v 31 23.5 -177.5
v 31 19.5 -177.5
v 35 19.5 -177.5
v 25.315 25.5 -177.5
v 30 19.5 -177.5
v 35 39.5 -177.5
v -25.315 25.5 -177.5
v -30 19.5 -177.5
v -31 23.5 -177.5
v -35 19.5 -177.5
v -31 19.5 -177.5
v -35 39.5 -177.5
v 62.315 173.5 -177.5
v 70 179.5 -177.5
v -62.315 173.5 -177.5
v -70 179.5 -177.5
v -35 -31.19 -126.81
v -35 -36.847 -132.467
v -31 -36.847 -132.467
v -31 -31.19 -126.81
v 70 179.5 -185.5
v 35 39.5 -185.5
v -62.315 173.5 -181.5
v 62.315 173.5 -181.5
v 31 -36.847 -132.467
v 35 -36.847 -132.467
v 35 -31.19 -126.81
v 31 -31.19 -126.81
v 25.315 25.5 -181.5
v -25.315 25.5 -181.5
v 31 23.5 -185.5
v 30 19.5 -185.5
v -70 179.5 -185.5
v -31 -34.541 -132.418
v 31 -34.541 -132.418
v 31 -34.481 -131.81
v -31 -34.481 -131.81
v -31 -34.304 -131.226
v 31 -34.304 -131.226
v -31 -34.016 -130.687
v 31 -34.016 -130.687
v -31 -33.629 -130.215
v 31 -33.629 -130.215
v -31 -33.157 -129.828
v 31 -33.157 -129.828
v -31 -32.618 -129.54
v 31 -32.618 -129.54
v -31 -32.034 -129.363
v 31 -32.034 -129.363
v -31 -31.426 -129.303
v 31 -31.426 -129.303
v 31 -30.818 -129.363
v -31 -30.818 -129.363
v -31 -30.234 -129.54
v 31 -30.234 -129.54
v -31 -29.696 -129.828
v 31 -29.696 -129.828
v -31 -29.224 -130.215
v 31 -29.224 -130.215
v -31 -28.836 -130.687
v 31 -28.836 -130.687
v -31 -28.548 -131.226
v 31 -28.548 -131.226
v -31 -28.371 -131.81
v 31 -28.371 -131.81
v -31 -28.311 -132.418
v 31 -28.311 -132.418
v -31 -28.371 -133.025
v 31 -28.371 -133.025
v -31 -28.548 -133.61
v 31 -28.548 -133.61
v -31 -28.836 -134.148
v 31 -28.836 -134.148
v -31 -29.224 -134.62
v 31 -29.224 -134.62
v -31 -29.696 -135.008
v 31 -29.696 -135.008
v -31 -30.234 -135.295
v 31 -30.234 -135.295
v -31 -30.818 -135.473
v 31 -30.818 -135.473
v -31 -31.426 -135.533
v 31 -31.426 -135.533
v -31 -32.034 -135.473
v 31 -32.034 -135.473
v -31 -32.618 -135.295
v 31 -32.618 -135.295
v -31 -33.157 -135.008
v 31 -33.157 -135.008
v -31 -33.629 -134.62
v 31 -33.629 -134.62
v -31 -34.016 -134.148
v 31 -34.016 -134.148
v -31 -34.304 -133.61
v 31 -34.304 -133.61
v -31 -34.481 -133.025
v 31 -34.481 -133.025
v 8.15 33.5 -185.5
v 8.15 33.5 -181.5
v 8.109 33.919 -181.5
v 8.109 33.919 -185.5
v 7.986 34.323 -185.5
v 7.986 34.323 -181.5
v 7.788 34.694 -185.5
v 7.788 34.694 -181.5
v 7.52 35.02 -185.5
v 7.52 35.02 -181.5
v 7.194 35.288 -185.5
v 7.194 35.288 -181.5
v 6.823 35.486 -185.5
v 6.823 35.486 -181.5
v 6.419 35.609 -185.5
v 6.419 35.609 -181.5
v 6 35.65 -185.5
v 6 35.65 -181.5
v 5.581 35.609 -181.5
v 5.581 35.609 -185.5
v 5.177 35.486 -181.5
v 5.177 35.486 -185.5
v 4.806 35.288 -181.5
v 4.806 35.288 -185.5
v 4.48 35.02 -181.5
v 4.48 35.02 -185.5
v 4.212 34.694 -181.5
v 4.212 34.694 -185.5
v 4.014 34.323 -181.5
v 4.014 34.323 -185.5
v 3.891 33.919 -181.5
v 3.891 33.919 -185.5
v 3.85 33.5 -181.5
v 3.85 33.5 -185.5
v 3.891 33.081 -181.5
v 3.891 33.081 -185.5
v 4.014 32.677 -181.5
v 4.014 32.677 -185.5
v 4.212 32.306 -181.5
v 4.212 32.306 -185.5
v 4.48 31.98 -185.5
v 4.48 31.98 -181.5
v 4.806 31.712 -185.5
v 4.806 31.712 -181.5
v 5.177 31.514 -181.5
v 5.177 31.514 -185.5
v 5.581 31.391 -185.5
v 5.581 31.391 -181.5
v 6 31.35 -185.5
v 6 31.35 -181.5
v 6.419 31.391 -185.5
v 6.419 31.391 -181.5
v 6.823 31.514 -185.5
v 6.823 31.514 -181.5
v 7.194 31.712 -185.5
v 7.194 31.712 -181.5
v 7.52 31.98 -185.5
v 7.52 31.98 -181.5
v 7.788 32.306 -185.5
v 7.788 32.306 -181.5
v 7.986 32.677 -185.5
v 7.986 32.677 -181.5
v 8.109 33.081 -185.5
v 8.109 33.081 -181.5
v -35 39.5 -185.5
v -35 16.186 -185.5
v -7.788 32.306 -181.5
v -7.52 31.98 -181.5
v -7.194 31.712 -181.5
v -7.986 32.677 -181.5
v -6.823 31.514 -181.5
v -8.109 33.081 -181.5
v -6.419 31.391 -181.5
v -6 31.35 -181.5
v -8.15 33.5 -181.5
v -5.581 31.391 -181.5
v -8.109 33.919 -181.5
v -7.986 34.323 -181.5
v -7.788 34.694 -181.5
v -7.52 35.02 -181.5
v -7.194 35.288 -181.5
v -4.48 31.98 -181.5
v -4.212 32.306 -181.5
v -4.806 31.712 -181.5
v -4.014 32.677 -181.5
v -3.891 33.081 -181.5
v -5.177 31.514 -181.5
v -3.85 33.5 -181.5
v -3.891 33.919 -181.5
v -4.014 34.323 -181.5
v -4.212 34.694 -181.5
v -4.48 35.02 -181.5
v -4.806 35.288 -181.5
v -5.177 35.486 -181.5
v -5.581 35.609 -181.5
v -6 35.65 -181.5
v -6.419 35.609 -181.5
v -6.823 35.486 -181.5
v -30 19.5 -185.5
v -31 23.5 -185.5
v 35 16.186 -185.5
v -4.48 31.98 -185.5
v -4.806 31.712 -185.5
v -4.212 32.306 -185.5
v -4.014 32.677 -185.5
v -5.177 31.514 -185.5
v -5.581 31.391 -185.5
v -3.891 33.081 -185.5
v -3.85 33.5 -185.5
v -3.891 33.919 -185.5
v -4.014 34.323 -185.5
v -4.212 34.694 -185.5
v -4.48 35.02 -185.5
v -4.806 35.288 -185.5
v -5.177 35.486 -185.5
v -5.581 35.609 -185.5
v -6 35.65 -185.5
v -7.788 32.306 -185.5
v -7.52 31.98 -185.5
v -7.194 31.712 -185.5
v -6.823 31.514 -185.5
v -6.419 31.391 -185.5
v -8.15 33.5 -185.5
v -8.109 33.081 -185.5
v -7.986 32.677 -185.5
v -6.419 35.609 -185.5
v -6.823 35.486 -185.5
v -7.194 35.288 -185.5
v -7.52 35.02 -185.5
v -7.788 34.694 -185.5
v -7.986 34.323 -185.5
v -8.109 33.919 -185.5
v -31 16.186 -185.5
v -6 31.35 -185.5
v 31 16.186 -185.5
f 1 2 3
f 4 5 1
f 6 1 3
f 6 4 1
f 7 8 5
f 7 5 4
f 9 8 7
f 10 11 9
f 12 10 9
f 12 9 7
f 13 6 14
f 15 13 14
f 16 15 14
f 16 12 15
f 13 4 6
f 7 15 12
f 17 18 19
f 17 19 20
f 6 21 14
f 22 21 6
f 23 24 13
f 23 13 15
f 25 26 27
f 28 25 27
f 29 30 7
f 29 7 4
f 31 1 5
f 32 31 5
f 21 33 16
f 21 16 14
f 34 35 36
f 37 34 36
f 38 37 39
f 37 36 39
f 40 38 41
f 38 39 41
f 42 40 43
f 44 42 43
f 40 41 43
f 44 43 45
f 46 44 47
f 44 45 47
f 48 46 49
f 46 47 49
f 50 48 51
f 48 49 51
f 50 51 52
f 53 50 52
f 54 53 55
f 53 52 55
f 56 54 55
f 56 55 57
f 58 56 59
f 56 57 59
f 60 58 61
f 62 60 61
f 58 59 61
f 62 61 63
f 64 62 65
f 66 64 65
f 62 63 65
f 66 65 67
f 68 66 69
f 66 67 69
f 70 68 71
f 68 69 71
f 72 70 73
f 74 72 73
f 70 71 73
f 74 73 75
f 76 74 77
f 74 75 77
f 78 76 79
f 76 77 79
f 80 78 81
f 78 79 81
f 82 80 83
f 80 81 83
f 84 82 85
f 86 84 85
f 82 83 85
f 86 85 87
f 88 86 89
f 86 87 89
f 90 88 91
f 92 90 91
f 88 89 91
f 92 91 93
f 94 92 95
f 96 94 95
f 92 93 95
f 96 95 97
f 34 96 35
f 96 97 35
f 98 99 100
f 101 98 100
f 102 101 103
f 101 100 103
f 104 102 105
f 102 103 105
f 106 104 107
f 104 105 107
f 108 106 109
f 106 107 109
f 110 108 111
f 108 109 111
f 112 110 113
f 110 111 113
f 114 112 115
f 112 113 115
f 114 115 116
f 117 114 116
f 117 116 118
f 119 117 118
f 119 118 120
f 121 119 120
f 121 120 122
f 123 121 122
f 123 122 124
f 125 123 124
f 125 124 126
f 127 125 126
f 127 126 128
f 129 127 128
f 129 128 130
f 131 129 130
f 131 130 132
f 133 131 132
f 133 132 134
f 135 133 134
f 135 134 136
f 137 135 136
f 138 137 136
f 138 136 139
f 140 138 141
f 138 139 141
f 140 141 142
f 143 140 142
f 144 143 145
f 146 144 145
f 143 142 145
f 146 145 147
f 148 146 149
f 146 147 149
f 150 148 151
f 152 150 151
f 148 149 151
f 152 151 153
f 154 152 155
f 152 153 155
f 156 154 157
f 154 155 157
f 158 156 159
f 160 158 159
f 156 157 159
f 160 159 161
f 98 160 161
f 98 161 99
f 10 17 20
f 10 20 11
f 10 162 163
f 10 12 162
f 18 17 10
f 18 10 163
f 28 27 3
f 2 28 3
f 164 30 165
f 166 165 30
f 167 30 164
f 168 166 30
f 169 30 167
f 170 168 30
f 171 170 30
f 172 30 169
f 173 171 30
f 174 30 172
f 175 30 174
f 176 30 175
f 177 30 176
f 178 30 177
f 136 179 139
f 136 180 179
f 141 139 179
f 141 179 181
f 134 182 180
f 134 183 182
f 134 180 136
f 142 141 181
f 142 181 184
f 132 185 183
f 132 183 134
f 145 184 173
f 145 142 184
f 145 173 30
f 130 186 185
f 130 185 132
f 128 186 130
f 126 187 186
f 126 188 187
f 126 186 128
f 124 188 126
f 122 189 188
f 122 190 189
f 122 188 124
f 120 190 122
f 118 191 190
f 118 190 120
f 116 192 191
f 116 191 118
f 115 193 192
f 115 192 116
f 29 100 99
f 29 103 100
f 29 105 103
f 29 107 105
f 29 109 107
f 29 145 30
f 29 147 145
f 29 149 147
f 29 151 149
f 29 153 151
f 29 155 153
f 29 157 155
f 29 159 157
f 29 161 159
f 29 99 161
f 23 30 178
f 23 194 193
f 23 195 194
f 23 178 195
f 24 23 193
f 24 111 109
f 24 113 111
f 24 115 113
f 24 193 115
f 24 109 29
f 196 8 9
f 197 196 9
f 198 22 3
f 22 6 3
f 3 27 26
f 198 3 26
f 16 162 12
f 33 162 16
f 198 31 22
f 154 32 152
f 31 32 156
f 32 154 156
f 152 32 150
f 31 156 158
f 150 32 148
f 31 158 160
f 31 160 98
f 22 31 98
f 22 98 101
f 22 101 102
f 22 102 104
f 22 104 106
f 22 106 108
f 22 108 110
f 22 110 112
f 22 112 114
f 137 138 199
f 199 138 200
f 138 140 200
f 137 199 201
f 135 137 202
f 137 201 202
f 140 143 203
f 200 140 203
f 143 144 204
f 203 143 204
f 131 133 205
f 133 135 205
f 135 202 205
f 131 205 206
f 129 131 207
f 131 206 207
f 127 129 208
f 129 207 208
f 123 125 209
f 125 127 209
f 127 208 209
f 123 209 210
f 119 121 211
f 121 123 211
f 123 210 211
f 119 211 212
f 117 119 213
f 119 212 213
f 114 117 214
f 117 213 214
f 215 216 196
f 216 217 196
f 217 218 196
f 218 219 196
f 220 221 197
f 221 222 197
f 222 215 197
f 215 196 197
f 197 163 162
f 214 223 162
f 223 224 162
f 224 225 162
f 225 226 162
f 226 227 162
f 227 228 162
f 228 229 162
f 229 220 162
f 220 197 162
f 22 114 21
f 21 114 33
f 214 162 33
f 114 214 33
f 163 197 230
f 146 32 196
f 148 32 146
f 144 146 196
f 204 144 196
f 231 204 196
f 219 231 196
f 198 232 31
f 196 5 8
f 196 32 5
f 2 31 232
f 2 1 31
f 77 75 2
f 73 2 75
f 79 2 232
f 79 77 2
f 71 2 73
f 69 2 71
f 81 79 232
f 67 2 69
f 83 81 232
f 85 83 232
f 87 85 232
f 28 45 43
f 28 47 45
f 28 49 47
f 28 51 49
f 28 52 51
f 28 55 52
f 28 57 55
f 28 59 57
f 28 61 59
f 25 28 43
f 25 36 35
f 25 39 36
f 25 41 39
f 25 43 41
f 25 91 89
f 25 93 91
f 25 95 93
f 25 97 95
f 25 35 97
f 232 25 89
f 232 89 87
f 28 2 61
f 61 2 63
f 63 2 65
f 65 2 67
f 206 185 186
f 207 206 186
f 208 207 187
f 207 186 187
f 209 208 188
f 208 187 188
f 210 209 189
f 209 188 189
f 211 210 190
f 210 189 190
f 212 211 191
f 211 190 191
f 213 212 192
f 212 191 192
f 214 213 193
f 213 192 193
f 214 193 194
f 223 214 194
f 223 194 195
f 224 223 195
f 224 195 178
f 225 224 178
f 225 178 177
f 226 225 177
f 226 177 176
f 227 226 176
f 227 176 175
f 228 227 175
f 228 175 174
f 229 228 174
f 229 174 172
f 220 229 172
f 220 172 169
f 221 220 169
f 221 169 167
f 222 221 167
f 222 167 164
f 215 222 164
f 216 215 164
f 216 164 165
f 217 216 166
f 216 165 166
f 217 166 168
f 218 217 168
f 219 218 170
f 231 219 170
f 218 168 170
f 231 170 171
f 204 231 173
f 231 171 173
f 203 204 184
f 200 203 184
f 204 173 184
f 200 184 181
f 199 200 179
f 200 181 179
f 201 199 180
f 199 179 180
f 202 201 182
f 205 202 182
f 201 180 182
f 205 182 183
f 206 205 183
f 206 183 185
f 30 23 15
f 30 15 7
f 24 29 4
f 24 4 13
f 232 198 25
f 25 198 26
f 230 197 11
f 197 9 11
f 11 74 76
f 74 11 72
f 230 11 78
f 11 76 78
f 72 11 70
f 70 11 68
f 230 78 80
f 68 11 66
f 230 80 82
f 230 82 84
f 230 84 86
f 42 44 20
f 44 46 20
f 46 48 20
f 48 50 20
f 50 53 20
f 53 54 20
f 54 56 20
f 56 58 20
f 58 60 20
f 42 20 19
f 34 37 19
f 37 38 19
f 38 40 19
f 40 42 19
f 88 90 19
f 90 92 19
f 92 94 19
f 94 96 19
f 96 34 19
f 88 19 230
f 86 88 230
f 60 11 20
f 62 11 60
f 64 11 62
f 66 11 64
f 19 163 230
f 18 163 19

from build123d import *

# Parameters (mm, degrees)
PAD065_DEPTH    = 4
PAD066_DEPTH    = 4
PAD067_DEPTH    = 4
SKETCH128_R     = 3.114724
PAD068_DEPTH    = 62
SKETCH129_R     = 2.15
POCKET018_DEPTH = 4.001


with BuildPart() as part:
    # Sketch125 → Pad065 (new body)
    with BuildSketch(Plane.XY):
        Polygon((70, 160), (-70, 160), (-30, 0), (30, 0), align=None)
    extrude(amount=PAD065_DEPTH)

    # Sketch126 (on Face6 of Pad065) → Pad066 (join)
    with BuildSketch(Plane.XY.offset(4)):
        Polygon((-30, 0), (-70, 160), (70, 160), (30, 0), align=None)
        Polygon((-62.315342, 154), (-25.315342, 6), (25.315342, 6), (62.315342, 154), align=None, mode=Mode.SUBTRACT)
    extrude(amount=PAD066_DEPTH)

    # Sketch127 → Pad067 (join)
    with BuildSketch(Plane.YZ.offset(35)):
        Polygon((0, 0), (-3.313708, 0), (-56.346717, 53.033009), (-50.689863, 58.689863), (0, 8), (21, 8), (21, 0), align=None)
    pad067 = extrude(amount=-PAD067_DEPTH)

    # Mirrored006: Pad067 across YZ
    add(pad067.mirror(Plane.YZ))

    # Sketch128 (on Face28 of MultiTransform005) → Pad068 (join)
    with BuildSketch(Plane(origin=(31, 0, 0), x_dir=(0, -1, 0), z_dir=(-1, 0, 0))):
        with Locations((50.926114, 53.082153)):
            Circle(SKETCH128_R)
    extrude(amount=PAD068_DEPTH)

    # Sketch129 (on Face40 of Pad068) → Pocket018 (cut, through all)
    with BuildSketch(Plane.XY.offset(4)):
        with Locations((-6, 14)):
            Circle(SKETCH129_R)
        with Locations((6, 14)):
            Circle(SKETCH129_R)
    extrude(amount=-POCKET018_DEPTH, mode=Mode.SUBTRACT)


with BuildPart() as part_1:
    # Body029 placement: moved
    add(part.part.moved(Location((0, 19.5, -185.5))))


solid = part_1.part
